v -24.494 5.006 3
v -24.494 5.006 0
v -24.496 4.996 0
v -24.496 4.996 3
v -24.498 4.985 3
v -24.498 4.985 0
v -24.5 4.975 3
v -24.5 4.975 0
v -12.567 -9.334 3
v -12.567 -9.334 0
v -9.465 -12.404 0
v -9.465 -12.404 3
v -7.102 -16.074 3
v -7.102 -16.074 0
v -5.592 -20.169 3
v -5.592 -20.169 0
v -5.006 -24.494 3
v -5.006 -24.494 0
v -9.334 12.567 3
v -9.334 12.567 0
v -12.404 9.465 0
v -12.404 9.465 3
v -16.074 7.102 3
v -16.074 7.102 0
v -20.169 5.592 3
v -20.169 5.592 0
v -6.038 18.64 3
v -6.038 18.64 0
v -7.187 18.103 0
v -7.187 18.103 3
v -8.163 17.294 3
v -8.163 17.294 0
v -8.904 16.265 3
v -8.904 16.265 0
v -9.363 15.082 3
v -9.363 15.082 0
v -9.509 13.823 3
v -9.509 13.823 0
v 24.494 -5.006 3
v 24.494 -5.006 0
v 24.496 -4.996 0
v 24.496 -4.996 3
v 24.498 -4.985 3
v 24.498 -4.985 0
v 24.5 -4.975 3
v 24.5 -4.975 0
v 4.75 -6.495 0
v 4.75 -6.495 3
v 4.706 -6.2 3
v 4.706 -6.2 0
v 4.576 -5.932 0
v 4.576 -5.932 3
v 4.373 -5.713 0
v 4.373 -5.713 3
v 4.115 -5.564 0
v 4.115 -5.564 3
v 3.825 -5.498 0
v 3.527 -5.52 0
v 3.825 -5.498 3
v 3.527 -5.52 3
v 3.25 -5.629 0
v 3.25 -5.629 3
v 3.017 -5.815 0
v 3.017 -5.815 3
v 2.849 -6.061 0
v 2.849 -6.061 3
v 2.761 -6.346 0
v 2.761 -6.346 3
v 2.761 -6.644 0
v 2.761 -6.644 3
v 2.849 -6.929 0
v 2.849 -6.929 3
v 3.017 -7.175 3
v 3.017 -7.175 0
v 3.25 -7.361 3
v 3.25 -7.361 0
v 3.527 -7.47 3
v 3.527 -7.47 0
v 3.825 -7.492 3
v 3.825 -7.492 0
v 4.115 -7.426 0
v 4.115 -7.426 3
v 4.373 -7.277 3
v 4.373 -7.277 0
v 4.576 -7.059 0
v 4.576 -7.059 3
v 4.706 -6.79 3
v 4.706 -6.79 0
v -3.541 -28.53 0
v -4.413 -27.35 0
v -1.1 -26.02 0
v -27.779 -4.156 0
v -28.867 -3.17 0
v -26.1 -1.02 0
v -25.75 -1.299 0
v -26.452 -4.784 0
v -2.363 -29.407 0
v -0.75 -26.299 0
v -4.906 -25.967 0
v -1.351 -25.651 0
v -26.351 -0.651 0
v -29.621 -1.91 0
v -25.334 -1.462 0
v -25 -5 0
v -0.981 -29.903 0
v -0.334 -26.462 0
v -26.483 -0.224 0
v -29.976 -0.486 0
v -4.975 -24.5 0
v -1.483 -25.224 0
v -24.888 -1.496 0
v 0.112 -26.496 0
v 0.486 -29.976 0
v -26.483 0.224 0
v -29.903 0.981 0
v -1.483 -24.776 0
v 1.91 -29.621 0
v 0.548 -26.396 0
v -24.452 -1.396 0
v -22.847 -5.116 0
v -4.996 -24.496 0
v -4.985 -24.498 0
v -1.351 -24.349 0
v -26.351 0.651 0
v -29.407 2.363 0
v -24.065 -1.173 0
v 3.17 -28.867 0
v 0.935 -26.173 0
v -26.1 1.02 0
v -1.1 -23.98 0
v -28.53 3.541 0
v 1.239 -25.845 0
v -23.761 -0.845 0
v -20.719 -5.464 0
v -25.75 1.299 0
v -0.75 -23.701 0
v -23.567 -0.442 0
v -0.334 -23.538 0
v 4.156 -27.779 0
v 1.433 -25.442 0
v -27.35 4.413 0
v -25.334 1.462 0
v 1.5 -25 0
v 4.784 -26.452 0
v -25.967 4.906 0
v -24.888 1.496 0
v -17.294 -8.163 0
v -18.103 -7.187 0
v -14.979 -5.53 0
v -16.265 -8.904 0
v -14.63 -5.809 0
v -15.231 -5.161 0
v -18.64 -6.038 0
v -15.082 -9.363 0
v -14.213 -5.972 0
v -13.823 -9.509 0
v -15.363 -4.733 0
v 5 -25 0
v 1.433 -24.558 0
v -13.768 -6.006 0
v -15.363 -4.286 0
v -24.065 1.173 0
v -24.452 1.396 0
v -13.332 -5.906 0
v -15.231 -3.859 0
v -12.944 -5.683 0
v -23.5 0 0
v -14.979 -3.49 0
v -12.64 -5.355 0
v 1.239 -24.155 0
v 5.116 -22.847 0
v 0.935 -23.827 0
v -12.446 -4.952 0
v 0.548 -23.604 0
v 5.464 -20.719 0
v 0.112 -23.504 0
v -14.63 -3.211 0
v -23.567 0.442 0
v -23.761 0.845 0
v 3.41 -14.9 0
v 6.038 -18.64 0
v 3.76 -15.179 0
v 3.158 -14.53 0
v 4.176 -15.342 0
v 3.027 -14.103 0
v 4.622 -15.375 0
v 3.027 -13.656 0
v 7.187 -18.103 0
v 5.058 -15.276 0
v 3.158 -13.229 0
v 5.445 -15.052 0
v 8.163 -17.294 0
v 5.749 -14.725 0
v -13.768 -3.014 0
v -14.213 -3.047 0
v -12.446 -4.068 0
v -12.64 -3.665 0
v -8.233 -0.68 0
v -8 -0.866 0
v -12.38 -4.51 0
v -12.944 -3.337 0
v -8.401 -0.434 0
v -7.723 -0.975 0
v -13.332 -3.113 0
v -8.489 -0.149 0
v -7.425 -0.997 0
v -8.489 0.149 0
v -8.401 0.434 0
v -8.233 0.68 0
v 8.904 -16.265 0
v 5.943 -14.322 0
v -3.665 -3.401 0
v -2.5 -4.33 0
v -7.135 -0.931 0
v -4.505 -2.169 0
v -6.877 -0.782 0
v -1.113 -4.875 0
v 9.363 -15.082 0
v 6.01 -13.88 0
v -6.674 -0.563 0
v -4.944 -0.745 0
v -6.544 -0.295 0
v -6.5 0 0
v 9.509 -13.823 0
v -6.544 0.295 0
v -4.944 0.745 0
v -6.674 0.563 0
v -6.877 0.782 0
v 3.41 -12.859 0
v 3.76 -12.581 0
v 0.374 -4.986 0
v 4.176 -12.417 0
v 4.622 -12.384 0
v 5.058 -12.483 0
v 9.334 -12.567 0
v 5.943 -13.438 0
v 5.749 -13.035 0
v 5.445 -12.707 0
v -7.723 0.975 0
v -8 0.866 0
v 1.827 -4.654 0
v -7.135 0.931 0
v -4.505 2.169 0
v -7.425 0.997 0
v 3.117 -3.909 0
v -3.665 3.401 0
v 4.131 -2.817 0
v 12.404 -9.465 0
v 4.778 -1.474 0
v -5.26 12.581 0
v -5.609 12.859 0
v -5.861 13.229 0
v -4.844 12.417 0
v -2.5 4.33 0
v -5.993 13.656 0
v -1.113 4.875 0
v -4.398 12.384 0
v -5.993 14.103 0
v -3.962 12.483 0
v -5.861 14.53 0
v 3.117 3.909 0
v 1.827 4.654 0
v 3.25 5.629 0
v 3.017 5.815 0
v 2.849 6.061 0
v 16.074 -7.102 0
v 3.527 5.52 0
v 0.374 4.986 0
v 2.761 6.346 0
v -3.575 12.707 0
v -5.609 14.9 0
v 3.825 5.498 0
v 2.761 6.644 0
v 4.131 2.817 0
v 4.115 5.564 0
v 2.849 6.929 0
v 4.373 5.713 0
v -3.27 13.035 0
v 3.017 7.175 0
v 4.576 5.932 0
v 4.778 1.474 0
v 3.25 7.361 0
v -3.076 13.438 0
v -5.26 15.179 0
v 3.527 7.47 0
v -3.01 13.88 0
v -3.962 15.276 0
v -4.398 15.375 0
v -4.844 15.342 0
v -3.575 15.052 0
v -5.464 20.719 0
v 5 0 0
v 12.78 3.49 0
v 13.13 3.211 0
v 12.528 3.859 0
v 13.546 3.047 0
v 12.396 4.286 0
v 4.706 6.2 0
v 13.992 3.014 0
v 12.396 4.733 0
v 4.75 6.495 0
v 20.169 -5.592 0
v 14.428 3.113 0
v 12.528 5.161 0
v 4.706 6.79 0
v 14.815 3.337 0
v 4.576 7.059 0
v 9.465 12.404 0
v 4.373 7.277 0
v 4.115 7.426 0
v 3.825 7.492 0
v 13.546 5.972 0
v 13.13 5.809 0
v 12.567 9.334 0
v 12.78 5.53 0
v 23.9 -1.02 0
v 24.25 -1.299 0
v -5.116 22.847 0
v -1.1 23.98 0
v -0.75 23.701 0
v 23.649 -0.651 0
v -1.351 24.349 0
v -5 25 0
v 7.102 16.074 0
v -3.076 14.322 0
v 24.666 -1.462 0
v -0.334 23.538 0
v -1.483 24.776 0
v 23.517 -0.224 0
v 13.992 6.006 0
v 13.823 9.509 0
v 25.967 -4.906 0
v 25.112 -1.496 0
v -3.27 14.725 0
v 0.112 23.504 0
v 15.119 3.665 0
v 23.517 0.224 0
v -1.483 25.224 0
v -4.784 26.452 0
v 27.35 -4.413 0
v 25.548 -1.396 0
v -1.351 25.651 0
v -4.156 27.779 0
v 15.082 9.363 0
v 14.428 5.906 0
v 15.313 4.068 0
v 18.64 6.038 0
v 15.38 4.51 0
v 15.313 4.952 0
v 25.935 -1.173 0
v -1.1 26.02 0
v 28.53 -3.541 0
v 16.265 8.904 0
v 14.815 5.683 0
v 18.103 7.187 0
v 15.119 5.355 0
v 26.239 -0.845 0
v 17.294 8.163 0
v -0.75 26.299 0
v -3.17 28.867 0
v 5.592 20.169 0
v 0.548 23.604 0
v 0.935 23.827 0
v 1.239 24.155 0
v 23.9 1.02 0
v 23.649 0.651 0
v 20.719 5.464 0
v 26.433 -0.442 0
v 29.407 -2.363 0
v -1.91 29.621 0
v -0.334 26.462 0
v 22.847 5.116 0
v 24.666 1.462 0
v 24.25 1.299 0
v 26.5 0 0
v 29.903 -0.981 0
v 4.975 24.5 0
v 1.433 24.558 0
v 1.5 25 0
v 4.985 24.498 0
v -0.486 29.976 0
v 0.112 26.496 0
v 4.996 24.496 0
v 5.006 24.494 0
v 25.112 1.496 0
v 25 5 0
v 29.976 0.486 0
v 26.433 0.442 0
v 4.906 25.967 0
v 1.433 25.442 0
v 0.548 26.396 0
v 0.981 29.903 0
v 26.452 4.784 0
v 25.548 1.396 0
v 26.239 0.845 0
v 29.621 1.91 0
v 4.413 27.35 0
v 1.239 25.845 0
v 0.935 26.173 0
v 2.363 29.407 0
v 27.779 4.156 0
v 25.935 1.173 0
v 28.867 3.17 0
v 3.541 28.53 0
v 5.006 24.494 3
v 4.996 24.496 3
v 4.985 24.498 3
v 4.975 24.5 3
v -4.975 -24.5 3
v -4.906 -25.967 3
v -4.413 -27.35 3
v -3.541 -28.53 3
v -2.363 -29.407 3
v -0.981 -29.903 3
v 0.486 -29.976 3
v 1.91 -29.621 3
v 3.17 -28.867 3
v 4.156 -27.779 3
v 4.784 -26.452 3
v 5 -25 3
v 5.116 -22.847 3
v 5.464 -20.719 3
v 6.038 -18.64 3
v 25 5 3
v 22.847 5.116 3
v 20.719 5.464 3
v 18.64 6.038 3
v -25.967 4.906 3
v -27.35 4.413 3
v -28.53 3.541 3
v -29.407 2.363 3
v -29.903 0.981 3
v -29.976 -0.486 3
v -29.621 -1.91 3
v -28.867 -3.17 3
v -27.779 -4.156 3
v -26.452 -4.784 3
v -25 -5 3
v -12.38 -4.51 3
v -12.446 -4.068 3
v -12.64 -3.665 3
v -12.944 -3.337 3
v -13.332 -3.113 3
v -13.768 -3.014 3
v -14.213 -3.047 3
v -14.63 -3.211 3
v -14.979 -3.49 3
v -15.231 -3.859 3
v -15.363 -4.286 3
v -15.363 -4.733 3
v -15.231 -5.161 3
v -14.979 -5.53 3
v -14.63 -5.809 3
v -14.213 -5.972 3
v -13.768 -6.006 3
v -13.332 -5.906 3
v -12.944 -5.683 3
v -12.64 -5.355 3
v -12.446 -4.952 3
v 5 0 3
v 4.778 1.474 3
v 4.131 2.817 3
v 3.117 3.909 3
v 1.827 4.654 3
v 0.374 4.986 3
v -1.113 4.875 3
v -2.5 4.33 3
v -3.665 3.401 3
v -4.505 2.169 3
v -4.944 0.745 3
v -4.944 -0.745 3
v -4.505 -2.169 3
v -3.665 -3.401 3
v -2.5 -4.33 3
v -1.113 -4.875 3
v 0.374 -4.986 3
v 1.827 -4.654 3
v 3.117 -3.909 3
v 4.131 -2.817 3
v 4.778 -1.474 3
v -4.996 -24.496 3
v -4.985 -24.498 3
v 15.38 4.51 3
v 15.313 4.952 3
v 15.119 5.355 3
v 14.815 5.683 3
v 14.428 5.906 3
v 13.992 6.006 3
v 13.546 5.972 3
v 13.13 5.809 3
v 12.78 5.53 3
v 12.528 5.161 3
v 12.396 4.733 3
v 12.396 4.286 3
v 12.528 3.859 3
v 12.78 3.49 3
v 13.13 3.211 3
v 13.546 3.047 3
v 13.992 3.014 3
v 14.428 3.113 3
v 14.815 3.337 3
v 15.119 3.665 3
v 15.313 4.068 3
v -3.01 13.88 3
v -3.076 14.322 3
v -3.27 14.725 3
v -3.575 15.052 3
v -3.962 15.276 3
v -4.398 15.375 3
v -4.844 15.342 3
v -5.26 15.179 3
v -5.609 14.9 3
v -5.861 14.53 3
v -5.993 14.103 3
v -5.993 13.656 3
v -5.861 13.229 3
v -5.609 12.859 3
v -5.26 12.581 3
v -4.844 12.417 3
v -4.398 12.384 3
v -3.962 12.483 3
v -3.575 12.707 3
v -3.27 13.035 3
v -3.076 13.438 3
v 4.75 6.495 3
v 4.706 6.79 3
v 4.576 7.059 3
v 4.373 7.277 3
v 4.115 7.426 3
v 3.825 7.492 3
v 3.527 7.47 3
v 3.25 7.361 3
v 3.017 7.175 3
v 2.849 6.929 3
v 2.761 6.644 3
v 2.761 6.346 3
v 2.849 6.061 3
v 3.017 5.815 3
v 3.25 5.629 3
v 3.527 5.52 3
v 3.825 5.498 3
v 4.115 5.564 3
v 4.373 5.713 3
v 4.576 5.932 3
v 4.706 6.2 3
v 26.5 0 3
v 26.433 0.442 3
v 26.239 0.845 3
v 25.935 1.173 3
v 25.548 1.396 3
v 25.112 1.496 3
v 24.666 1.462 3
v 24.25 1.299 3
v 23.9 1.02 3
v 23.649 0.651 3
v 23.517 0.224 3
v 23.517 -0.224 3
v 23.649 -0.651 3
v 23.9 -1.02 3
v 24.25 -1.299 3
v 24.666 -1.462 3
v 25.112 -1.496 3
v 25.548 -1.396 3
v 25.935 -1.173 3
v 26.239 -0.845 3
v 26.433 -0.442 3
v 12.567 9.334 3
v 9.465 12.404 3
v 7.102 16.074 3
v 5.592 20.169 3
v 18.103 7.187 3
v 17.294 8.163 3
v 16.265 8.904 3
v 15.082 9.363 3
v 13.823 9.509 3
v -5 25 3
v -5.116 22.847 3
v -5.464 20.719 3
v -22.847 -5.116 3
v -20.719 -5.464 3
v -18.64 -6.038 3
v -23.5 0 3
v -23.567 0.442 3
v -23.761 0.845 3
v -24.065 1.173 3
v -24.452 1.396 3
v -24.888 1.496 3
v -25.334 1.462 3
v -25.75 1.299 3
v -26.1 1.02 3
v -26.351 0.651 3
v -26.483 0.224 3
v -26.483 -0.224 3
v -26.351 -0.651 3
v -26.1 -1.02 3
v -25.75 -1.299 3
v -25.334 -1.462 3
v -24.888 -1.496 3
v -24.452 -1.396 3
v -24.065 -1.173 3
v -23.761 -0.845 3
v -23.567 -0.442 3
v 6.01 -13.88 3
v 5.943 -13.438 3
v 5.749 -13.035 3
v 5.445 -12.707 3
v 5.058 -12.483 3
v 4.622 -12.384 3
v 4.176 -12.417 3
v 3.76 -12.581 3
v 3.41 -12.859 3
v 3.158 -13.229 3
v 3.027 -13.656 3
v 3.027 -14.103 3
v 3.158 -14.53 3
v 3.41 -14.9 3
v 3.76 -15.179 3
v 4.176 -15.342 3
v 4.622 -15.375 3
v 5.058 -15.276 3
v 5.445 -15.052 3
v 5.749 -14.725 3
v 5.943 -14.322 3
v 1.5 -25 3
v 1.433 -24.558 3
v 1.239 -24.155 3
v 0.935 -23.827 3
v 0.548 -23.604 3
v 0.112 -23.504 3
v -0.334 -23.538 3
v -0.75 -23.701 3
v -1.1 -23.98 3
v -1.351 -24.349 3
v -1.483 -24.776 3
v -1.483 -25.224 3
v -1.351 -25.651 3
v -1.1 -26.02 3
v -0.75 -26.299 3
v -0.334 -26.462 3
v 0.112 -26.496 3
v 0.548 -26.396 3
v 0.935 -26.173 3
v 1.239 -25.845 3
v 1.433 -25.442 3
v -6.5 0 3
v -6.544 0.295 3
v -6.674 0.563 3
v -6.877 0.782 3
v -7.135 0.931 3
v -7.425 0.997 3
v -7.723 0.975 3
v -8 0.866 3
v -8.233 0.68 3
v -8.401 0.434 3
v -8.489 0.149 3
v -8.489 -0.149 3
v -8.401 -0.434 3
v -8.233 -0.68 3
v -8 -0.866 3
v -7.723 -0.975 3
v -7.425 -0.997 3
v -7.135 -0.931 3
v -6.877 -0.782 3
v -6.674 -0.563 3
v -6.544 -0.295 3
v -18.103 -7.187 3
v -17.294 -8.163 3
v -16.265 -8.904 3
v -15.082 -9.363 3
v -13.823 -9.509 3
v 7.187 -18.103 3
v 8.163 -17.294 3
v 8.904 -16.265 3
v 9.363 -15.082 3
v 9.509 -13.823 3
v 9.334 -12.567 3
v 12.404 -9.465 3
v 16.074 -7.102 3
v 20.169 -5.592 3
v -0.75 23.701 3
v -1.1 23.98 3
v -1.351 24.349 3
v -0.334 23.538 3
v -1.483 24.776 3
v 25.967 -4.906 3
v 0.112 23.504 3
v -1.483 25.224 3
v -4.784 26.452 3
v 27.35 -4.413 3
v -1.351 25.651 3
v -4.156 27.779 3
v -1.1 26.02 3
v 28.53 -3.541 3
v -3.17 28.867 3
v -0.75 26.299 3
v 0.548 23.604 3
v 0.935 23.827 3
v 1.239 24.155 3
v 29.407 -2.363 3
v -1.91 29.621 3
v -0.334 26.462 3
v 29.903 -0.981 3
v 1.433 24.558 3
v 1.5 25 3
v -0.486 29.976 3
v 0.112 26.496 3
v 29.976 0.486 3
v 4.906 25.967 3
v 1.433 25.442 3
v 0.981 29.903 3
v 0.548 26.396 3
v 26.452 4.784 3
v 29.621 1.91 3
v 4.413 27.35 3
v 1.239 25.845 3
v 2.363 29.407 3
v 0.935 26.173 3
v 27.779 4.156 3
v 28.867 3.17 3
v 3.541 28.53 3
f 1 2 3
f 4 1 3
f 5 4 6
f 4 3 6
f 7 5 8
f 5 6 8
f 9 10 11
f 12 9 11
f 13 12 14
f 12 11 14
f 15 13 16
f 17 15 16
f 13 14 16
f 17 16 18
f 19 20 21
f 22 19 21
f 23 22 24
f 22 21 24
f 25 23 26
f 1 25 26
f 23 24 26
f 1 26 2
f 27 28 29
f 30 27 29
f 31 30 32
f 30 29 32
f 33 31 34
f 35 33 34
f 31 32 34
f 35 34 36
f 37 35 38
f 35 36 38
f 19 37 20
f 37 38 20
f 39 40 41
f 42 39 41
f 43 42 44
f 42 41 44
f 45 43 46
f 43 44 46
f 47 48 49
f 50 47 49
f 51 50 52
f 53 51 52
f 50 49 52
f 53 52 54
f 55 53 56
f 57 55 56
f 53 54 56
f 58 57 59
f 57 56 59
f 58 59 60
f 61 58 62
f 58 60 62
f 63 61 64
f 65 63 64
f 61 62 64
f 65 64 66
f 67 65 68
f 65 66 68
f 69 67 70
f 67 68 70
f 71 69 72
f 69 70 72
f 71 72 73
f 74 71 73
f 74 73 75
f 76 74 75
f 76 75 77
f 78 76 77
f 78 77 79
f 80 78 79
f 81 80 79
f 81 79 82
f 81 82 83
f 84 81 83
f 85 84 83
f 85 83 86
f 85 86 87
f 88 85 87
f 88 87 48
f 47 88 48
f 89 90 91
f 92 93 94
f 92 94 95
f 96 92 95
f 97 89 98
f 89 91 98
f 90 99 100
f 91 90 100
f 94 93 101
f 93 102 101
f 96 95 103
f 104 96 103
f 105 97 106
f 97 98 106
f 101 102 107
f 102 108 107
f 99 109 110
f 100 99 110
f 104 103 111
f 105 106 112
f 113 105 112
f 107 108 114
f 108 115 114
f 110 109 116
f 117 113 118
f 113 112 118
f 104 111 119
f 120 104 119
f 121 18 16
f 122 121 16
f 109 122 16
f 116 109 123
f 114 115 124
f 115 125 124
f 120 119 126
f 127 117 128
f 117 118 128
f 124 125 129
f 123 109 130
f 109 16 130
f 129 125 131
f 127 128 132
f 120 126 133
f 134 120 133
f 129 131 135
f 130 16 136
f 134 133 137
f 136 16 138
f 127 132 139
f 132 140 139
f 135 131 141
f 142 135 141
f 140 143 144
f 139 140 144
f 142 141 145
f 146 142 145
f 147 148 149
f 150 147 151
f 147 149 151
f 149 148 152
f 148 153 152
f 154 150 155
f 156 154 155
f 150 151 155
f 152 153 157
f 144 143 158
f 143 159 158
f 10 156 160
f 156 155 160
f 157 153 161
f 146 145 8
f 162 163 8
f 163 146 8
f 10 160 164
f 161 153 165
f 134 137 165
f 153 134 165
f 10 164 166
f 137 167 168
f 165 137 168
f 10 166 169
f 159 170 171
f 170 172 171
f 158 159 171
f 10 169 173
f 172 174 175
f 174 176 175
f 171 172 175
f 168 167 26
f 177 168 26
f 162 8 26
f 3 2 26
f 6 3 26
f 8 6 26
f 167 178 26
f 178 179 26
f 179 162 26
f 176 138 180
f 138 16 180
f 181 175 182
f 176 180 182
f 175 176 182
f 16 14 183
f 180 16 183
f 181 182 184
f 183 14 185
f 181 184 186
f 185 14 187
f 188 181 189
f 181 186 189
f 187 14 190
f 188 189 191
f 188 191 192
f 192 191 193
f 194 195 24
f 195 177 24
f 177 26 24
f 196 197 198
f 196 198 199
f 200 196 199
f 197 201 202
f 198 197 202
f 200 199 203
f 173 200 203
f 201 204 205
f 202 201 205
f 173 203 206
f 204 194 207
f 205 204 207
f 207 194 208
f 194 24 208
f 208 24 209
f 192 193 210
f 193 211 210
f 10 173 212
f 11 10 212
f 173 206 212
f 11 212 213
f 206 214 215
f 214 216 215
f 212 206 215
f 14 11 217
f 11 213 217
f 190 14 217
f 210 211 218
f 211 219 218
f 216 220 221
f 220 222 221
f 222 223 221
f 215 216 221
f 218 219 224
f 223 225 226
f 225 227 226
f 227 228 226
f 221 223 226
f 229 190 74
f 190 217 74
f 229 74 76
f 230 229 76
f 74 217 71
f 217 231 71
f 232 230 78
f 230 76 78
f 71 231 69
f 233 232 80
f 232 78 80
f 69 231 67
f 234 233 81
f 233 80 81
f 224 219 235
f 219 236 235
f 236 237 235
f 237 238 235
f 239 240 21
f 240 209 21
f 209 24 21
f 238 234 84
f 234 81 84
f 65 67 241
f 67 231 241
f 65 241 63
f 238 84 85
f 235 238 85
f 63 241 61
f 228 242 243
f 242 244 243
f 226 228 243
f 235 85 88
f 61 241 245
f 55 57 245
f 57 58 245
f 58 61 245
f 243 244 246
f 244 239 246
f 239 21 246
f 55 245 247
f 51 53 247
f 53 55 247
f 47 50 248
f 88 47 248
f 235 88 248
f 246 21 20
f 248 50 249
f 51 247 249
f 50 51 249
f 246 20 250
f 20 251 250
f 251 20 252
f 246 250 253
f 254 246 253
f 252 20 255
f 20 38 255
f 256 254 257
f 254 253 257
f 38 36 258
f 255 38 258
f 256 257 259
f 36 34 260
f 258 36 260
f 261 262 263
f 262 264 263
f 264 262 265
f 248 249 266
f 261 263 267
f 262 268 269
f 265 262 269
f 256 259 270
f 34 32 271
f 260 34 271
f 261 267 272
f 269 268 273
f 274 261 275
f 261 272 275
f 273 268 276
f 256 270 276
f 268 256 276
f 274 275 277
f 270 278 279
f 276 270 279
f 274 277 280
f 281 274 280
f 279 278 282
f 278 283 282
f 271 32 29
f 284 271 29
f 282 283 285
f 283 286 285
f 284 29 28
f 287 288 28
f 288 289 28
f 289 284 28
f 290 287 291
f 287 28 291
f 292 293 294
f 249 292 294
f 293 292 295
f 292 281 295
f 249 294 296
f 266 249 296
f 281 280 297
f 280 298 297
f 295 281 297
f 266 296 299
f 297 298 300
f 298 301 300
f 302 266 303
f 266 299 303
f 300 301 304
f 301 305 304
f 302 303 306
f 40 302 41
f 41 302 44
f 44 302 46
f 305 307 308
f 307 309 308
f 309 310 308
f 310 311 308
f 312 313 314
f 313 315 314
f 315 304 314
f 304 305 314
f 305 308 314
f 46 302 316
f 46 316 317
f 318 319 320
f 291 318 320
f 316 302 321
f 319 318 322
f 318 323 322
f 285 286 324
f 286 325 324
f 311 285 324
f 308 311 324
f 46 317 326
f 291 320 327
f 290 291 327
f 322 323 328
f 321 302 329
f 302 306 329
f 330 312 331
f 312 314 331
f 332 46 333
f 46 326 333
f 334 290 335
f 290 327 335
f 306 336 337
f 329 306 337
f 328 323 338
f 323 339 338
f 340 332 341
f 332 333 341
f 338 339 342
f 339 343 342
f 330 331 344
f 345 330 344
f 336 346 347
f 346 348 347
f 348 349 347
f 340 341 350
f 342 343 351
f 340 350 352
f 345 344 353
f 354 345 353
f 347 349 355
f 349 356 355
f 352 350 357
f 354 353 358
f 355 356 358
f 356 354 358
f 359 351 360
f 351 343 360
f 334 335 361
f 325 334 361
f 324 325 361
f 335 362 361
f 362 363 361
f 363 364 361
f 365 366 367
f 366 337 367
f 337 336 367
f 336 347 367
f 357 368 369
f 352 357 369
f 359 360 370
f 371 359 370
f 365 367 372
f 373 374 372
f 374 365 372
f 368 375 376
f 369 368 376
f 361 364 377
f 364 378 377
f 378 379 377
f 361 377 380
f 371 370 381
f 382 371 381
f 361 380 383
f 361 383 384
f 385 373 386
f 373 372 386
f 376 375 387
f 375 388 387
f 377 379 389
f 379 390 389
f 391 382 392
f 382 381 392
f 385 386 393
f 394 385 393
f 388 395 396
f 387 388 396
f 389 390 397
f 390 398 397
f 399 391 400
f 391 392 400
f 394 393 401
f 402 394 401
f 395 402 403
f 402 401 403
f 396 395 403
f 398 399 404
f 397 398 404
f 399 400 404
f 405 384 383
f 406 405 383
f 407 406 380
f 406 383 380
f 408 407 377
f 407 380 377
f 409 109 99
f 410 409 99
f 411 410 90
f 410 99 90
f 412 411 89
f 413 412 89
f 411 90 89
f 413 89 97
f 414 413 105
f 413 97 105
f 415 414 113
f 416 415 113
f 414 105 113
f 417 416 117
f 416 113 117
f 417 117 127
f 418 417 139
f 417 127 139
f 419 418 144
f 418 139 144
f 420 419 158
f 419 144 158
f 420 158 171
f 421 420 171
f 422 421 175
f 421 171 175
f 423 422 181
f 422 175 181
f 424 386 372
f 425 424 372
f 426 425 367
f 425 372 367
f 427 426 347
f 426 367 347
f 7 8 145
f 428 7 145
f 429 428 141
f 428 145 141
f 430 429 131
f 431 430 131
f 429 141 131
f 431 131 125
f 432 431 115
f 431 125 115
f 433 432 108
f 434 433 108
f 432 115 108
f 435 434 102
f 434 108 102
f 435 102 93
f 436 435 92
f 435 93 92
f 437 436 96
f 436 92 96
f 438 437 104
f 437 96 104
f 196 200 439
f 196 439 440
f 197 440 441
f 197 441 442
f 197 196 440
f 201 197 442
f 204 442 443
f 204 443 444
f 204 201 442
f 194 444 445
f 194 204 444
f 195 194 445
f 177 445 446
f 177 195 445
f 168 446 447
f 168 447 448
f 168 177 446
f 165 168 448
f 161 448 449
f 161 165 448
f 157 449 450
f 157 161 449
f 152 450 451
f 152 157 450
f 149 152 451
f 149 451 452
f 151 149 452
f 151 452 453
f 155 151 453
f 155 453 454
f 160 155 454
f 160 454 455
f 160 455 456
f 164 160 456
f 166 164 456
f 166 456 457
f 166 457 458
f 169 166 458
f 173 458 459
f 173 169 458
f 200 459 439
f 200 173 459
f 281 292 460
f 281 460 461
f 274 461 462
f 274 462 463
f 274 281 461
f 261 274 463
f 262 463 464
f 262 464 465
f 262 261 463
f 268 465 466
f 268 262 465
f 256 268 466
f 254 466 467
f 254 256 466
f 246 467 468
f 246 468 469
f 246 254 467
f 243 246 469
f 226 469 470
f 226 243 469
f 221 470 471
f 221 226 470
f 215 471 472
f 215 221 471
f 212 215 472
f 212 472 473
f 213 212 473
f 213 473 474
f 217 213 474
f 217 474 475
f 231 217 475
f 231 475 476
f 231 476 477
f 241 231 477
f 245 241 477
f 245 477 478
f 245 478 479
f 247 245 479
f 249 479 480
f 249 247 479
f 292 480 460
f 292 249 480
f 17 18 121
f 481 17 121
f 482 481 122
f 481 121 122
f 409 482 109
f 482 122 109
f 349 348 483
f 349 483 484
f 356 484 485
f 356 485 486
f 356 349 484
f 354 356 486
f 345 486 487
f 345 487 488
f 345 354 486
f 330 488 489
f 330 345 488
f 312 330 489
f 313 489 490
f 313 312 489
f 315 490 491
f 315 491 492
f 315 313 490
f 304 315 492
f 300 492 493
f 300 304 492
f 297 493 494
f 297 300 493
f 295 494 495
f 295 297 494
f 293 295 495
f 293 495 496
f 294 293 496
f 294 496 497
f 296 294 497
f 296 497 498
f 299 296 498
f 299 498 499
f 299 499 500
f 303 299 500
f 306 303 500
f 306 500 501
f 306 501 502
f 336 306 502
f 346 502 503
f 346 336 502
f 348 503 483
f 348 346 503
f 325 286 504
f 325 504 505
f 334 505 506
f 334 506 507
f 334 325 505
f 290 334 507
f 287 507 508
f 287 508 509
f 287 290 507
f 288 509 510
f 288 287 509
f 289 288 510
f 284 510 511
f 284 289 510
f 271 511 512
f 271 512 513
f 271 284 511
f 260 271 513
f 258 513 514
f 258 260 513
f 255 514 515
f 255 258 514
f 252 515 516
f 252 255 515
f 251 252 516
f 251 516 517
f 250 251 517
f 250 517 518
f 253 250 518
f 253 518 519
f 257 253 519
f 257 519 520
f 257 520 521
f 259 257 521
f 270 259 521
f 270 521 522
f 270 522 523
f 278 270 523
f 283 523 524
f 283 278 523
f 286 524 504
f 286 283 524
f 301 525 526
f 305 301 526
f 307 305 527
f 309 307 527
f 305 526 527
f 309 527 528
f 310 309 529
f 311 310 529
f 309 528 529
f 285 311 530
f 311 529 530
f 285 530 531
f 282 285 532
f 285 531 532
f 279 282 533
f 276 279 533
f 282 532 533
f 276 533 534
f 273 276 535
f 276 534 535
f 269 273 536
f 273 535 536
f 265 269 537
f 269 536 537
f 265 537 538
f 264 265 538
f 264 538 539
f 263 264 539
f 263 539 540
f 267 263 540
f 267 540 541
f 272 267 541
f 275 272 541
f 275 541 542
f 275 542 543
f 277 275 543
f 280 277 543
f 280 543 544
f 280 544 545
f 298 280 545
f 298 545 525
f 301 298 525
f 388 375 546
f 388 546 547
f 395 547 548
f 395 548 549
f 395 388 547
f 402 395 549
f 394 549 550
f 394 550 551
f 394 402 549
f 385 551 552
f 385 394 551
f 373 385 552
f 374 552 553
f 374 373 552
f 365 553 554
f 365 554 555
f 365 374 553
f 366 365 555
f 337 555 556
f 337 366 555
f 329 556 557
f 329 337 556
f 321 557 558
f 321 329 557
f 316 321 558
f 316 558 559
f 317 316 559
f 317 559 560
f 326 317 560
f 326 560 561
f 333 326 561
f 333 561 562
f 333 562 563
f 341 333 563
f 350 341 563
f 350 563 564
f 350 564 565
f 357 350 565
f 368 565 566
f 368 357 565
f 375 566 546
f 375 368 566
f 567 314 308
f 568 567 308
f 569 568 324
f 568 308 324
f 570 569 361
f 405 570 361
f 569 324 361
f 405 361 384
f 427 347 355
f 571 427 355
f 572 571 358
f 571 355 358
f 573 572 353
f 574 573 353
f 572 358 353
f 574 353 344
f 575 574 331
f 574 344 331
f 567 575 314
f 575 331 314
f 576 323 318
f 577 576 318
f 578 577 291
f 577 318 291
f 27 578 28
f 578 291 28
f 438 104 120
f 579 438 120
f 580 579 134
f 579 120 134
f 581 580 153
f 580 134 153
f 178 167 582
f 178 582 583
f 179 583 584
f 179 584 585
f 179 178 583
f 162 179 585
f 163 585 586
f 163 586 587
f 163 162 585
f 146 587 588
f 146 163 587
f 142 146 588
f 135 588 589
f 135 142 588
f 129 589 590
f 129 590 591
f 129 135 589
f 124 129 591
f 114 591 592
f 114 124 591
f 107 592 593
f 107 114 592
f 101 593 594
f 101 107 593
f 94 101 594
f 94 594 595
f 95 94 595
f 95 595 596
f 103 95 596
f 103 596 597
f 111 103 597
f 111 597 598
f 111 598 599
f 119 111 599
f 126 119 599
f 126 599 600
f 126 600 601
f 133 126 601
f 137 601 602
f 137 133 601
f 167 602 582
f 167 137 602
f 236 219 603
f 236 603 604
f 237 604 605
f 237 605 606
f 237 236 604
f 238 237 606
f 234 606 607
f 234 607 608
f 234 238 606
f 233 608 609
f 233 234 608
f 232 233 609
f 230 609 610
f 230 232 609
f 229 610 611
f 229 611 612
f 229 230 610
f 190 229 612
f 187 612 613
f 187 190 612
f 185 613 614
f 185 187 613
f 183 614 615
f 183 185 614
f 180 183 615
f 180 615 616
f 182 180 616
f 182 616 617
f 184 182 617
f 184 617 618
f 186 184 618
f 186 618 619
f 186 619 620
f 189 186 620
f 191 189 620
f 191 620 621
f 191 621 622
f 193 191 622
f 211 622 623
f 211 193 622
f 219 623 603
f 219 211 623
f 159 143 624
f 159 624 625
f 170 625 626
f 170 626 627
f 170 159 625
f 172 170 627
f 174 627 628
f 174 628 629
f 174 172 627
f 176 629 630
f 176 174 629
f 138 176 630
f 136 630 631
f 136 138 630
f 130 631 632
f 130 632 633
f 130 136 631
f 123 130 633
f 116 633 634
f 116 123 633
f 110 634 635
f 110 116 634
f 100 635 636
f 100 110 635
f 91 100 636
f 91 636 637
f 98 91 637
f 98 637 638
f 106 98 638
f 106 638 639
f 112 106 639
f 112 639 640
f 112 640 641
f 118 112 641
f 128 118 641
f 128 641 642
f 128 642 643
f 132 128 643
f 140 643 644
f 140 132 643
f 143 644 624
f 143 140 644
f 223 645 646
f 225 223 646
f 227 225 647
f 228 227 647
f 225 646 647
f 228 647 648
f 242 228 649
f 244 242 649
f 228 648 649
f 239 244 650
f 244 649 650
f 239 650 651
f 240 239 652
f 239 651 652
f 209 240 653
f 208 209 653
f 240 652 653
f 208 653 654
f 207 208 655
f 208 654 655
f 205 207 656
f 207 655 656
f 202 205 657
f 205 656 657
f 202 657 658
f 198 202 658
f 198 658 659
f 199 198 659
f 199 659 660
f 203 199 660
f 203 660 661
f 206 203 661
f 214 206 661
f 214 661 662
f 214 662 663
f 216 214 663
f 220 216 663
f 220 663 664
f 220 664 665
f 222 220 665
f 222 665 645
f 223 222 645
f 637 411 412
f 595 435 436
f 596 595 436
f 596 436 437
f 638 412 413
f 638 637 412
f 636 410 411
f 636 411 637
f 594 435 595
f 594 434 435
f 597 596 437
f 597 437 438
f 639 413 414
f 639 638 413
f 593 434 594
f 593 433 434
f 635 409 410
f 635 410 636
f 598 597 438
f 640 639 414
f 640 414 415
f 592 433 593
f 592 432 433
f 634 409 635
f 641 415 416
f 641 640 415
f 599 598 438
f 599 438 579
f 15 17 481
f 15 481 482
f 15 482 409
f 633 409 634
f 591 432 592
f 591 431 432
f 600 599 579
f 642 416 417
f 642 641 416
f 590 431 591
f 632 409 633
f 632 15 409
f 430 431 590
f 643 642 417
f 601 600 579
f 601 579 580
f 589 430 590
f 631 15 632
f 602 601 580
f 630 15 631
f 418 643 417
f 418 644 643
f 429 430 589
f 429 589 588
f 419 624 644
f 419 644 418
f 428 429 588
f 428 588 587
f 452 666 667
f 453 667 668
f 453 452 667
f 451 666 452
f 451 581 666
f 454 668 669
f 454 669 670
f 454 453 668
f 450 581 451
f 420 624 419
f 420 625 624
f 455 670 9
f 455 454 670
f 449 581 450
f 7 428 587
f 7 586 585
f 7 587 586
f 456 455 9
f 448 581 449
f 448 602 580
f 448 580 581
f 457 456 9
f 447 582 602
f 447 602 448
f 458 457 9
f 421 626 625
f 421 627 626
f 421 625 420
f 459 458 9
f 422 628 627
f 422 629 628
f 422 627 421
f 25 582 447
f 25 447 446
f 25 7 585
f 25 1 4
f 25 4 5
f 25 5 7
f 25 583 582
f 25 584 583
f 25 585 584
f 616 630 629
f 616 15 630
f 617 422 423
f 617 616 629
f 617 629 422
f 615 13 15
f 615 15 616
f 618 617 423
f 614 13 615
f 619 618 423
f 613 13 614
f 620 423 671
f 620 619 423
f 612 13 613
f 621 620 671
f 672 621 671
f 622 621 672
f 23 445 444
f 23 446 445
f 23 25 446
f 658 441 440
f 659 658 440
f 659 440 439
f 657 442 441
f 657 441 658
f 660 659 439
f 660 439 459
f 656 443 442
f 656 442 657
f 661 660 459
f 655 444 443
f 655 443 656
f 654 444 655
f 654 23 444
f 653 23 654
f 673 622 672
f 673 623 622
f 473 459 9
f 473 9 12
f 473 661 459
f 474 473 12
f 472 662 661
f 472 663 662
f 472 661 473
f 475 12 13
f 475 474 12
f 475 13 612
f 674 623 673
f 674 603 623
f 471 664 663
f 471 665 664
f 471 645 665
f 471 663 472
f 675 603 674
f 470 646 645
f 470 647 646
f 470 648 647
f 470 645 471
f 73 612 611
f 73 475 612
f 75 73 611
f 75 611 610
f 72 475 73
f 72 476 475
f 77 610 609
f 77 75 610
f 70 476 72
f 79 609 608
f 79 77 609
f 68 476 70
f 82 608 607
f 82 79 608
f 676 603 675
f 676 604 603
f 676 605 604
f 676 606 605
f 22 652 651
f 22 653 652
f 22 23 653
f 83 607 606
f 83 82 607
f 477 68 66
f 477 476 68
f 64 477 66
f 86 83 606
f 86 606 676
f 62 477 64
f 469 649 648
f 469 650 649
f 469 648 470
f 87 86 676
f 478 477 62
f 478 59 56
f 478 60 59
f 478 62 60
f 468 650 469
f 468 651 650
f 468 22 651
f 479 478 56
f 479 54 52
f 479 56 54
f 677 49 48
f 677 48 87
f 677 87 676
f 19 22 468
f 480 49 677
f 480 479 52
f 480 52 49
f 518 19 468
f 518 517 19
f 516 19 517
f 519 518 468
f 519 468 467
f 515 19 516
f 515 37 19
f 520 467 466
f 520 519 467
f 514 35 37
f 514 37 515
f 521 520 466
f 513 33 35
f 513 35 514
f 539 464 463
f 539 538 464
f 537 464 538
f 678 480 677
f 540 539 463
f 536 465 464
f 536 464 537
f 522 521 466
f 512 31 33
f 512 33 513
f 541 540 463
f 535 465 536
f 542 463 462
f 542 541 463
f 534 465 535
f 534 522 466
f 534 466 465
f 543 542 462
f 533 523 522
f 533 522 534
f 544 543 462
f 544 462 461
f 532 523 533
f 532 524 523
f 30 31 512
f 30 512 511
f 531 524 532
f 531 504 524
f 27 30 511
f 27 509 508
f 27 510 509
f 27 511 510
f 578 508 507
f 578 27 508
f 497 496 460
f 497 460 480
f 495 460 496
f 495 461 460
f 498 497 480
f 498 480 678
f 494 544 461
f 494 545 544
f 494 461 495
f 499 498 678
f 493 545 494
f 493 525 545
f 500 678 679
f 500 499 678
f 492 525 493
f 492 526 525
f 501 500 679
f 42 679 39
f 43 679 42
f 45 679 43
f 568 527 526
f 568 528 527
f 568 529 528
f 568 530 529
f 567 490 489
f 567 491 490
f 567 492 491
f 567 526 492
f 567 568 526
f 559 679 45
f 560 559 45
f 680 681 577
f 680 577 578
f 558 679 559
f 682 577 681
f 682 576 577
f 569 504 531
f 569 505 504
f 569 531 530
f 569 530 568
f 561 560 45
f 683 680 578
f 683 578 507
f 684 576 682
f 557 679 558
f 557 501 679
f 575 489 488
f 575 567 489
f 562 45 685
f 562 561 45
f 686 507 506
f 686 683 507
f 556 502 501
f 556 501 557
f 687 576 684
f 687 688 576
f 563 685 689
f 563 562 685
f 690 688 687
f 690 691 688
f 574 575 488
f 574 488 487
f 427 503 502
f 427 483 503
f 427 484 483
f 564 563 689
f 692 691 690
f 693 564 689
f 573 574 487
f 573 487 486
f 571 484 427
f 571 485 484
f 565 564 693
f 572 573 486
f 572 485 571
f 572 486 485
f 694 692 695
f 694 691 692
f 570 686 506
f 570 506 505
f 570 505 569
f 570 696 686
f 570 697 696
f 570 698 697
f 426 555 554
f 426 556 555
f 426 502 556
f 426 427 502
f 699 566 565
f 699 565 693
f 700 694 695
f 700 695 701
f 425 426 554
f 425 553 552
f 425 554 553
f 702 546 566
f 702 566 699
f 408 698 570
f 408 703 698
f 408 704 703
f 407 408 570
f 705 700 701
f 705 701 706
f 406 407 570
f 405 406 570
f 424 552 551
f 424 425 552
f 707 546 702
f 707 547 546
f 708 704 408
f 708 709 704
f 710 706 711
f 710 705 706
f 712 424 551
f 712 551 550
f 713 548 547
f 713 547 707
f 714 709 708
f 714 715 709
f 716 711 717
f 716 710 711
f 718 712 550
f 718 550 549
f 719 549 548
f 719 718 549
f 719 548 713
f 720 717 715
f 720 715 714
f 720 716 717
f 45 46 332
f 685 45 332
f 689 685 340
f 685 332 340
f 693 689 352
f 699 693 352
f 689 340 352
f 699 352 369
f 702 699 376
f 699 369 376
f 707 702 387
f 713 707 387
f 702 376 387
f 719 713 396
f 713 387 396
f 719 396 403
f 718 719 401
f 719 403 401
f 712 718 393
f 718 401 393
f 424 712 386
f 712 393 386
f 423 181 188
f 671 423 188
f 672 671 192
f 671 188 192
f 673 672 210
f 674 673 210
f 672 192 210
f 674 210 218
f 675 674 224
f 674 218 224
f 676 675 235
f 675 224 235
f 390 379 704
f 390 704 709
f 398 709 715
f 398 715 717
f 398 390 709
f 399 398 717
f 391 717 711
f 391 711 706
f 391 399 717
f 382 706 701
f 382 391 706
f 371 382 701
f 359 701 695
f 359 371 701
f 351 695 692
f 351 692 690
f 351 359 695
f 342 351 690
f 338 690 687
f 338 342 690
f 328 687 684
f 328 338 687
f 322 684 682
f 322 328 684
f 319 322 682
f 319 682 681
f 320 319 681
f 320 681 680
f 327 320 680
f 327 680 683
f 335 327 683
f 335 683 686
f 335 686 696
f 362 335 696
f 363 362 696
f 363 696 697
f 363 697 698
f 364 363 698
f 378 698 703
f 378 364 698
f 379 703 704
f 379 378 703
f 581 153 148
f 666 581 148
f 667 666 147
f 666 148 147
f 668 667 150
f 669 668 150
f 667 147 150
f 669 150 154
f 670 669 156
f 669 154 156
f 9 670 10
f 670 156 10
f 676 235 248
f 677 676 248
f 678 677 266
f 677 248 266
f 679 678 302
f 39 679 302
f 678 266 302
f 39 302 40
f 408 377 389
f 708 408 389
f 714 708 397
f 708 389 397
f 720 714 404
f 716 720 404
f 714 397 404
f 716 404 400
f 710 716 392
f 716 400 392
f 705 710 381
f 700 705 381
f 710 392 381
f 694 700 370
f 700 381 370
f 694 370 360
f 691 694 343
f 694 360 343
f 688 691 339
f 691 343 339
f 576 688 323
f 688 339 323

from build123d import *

# Parameters (mm, degrees)
CROQUIS1_R              = 1.5
CROQUIS1_R_2            = 5
SALIENTE_EXTRUIR1_DEPTH = 3
CROQUIS2_R              = 1
CORTAR_EXTRUIR2_DEPTH   = 43.532340636


with BuildPart() as part:
    # Croquis1 → Saliente-Extruir1 (new body)
    with BuildSketch(Plane.XY):
        with BuildLine():
            ThreePointArc((-5.006412365, -24.493587635), (-4.990675805, -24.496798873), (-4.974937186, -24.5))
            ThreePointArc((-4.974937186, -24.5), (-0.250313875, -29.993730366), (5, -25))
            ThreePointArc((5, -25), (5.261221354, -21.77810342), (6.038061758, -18.640369658))
            ThreePointArc((6.038061758, -18.640369658), (8.90430573, -16.264636165), (9.334316304, -12.56672391))
            ThreePointArc((9.334316304, -12.56672391), (16.073984628, -7.10233955), (24.493587635, -5.006412365))
            ThreePointArc((24.493587635, -5.006412365), (24.496798873, -4.990675805), (24.5, -4.974937186))
            ThreePointArc((24.5, -4.974937186), (29.993730366, -0.250313875), (25, 5))
            ThreePointArc((25, 5), (21.77810342, 5.261221354), (18.640369658, 6.038061758))
            ThreePointArc((18.640369658, 6.038061758), (16.264636165, 8.90430573), (12.56672391, 9.334316304))
            ThreePointArc((12.56672391, 9.334316304), (7.10233955, 16.073984628), (5.006412365, 24.493587635))
            ThreePointArc((5.006412365, 24.493587635), (4.990675805, 24.496798873), (4.974937186, 24.5))
            ThreePointArc((4.974937186, 24.5), (0.250313875, 29.993730366), (-5, 25))
            ThreePointArc((-5, 25), (-5.261221354, 21.77810342), (-6.038061758, 18.640369658))
            ThreePointArc((-6.038061758, 18.640369658), (-8.90430573, 16.264636165), (-9.334316304, 12.56672391))
            ThreePointArc((-9.334316304, 12.56672391), (-16.073984628, 7.10233955), (-24.493587635, 5.006412365))
            ThreePointArc((-24.493587635, 5.006412365), (-24.496798873, 4.990675805), (-24.5, 4.974937186))
            ThreePointArc((-24.5, 4.974937186), (-29.993730366, 0.250313875), (-25, -5))
            ThreePointArc((-25, -5), (-21.77810342, -5.261221354), (-18.640369658, -6.038061758))
            ThreePointArc((-18.640369658, -6.038061758), (-16.264636165, -8.90430573), (-12.56672391, -9.334316304))
            ThreePointArc((-12.56672391, -9.334316304), (-7.10233955, -16.073984628), (-5.006412365, -24.493587635))
        make_face()
        with Locations((-25, 0)):
            Circle(CROQUIS1_R, mode=Mode.SUBTRACT)
        with Locations((0, -25)):
            Circle(CROQUIS1_R, mode=Mode.SUBTRACT)
        with Locations((4.50977544, -13.879661629)):
            Circle(CROQUIS1_R, mode=Mode.SUBTRACT)
        with Locations((0, 25)):
            Circle(CROQUIS1_R, mode=Mode.SUBTRACT)
        with Locations((13.879661629, 4.50977544)):
            Circle(CROQUIS1_R, mode=Mode.SUBTRACT)
        with Locations((25, 0)):
            Circle(CROQUIS1_R, mode=Mode.SUBTRACT)
        with Locations((-4.50977544, 13.879661629)):
            Circle(CROQUIS1_R, mode=Mode.SUBTRACT)
        with Locations((-13.879661629, -4.50977544)):
            Circle(CROQUIS1_R, mode=Mode.SUBTRACT)
        Circle(CROQUIS1_R_2, mode=Mode.SUBTRACT)
    extrude(amount=SALIENTE_EXTRUIR1_DEPTH)

    # Croquis2 → Cortar-Extruir2 (cut, through all)
    with BuildSketch(Plane.XY.offset(3)):
        with Locations((3.75, 6.495190528)):
            Circle(CROQUIS2_R)
        with Locations((3.75, -6.495190528)):
            Circle(CROQUIS2_R)
        with Locations((-7.5, 0)):
            Circle(CROQUIS2_R)
    extrude(amount=-CORTAR_EXTRUIR2_DEPTH, mode=Mode.SUBTRACT)


solid = part.part
